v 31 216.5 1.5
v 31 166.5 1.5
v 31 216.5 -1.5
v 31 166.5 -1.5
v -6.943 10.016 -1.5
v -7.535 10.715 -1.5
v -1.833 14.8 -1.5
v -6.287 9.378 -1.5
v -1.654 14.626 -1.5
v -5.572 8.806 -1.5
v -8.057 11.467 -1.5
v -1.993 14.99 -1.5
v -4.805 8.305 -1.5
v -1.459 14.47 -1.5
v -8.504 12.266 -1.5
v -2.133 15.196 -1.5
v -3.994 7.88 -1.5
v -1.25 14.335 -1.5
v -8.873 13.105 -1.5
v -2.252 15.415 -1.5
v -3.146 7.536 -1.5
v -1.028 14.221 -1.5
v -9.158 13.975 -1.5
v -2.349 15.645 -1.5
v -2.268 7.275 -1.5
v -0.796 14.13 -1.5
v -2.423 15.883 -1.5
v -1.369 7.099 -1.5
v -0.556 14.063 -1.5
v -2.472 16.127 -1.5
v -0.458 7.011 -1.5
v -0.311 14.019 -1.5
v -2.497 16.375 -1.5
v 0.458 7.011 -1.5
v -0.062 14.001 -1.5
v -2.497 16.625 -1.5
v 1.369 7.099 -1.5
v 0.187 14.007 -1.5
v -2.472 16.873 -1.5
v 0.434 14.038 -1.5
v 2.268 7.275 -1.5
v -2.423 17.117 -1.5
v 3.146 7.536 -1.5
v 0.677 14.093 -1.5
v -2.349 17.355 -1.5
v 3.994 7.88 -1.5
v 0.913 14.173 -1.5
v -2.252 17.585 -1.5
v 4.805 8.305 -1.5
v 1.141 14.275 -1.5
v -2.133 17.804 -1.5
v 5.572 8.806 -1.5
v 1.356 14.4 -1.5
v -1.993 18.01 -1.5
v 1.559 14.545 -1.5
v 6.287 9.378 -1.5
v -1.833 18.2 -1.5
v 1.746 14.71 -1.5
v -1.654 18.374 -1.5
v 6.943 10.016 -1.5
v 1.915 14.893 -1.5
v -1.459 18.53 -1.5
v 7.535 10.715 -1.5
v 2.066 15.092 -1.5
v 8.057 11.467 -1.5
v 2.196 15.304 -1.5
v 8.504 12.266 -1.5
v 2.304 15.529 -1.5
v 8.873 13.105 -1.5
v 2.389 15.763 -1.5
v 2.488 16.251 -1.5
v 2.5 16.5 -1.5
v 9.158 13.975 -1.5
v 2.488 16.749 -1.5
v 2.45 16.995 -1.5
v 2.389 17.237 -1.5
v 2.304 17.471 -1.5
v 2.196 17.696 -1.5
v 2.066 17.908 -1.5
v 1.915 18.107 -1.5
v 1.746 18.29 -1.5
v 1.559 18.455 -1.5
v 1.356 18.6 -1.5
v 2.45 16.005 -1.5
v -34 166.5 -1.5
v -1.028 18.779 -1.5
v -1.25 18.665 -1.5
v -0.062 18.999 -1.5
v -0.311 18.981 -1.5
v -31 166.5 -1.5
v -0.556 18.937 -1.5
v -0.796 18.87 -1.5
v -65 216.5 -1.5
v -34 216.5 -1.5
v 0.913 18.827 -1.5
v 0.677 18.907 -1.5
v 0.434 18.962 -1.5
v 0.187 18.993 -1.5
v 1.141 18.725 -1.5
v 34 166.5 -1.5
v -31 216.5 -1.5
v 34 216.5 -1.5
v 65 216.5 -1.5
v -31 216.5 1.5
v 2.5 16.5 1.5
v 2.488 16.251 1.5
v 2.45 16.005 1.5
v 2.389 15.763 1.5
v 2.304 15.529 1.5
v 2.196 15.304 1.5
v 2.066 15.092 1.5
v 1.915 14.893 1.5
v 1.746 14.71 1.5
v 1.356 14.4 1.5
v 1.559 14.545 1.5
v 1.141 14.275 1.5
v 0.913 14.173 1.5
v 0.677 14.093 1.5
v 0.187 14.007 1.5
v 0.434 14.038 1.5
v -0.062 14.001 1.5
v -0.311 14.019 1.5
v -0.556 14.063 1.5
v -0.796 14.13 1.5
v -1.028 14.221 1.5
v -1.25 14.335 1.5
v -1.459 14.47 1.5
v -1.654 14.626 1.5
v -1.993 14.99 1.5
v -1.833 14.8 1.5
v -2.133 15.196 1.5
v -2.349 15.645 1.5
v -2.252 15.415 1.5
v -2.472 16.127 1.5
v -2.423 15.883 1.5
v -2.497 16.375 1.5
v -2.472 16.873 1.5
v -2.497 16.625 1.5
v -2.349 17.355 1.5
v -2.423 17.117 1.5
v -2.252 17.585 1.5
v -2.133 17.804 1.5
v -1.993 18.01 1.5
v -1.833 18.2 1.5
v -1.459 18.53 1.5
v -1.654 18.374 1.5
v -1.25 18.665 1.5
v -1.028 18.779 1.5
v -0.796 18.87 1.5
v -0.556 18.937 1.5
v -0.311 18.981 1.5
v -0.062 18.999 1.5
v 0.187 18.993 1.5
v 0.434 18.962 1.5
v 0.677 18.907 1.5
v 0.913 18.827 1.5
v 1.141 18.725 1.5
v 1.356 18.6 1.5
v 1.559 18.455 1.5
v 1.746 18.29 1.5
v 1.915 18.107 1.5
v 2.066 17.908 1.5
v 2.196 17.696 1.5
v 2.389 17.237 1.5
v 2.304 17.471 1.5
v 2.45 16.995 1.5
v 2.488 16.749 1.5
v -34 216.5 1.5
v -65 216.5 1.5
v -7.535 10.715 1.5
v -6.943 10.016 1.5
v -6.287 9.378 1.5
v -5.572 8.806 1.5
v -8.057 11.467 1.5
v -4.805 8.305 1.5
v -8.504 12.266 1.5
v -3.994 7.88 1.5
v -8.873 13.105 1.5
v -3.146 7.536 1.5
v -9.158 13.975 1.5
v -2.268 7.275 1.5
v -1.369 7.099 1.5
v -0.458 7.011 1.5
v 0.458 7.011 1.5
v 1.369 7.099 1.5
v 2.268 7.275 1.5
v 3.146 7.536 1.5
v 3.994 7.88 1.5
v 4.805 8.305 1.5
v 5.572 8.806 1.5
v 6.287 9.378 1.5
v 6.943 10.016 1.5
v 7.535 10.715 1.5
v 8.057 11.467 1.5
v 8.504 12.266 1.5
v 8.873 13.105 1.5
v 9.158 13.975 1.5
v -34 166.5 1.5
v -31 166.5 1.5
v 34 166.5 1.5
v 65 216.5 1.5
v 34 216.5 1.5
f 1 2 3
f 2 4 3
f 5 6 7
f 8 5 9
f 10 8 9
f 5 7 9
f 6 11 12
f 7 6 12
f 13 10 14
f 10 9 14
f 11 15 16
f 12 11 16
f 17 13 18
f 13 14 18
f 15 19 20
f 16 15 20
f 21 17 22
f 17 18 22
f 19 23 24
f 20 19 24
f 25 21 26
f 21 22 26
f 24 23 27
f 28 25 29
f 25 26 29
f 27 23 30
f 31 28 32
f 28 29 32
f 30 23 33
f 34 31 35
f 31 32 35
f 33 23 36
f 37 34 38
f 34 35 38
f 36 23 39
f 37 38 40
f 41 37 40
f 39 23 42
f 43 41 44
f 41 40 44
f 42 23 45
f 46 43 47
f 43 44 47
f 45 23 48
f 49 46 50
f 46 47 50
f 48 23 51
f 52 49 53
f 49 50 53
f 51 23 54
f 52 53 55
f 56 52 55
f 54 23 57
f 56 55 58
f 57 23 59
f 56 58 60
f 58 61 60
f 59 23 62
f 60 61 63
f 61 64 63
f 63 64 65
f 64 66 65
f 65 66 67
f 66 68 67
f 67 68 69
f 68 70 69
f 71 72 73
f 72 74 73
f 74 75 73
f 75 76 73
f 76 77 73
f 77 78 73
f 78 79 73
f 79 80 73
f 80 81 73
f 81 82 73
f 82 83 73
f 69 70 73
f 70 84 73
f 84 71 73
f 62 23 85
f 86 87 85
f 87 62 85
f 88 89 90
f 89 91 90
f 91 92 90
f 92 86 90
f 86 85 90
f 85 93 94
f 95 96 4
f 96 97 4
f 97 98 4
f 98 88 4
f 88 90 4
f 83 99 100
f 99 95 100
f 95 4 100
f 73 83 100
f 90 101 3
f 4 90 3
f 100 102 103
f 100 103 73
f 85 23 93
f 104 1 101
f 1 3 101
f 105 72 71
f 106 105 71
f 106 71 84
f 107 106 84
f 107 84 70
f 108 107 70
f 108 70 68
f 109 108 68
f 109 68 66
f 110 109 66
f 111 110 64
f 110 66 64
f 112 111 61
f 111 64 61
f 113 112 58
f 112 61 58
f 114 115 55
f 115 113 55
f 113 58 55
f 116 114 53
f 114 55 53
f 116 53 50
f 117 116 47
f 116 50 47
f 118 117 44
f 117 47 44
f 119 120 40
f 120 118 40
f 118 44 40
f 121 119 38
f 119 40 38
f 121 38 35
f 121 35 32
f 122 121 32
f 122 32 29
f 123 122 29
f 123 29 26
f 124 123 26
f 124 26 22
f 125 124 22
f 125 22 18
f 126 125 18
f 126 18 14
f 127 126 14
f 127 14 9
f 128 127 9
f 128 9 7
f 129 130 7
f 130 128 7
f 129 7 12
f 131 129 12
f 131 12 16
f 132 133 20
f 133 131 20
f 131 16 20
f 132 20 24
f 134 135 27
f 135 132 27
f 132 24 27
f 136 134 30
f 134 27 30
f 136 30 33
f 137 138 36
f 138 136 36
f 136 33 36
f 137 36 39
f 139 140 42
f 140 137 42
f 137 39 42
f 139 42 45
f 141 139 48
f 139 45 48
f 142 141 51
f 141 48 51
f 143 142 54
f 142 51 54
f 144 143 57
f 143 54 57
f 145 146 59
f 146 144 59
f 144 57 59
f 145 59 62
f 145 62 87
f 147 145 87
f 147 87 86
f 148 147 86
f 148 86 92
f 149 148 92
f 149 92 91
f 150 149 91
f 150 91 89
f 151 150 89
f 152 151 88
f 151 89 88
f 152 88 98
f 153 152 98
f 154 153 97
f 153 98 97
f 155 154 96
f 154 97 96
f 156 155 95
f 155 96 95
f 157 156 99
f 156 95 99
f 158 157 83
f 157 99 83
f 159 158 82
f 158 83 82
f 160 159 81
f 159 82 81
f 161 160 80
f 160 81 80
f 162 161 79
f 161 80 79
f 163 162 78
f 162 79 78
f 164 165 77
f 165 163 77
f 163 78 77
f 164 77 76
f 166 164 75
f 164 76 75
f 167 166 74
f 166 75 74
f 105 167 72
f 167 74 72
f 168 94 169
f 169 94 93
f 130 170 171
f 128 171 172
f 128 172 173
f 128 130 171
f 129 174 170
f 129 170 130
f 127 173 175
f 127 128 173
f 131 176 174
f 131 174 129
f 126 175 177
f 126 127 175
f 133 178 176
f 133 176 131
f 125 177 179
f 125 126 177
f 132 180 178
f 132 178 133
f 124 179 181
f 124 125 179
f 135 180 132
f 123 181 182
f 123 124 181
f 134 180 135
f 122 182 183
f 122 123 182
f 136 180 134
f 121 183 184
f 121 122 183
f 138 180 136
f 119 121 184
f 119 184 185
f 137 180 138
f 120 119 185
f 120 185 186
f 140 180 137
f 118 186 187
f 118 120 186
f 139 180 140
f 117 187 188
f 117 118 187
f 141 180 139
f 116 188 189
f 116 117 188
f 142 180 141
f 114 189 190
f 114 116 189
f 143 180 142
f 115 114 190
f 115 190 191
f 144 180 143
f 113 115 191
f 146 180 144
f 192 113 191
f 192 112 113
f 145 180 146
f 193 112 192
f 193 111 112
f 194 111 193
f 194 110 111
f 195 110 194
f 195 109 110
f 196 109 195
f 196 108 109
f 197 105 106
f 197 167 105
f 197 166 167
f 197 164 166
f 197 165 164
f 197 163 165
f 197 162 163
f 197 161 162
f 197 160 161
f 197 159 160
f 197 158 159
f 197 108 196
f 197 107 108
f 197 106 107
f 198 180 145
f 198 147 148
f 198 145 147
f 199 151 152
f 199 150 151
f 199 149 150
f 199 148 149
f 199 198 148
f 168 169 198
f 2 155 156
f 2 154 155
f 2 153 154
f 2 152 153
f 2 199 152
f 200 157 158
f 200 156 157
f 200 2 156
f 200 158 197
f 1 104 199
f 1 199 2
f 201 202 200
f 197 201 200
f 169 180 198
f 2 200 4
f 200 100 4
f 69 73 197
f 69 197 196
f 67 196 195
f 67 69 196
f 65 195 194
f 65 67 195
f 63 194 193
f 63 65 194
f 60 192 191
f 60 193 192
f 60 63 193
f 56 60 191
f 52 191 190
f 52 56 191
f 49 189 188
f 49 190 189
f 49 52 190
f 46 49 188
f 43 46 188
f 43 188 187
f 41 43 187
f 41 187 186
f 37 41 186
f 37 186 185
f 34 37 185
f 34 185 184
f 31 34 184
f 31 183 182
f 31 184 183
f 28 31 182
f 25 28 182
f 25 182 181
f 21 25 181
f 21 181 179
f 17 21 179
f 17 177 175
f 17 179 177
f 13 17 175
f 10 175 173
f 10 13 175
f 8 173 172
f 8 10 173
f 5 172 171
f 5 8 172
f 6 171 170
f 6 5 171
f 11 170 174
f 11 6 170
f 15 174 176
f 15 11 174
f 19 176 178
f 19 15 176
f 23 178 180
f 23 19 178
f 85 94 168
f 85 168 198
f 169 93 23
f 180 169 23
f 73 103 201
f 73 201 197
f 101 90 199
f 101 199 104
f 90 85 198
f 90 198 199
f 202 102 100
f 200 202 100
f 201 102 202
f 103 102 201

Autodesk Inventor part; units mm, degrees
ref_plane "YZ Plane" through (0, 0, 0) normal (1, 0, 0) x (0, 1, 0)
ref_plane "XZ Plane" through (0, 0, 0) normal (0, 1, 0) x (-1, 0, 0)
ref_plane "XY Plane" through (0, 0, 0) normal (0, 0, 1) x (1, 0, 0)
sketch "Sketch1" plane through (0, 0, 0) normal (0, 0, 1) x (1, 0, 0)
  circle A0 centre (0, 16.5) radius 2.5 projected
  line L0 (0, 16.5) -> (0, 216.5) construction
  arc A1 (-9.1582, 13.9748) -> (9.1582, 13.9748) centre (0, 16.5) ccw
  line L1 (65, 216.5) -> (9.1582, 13.9748)
  circle A2 centre (0, 16.5) radius 2.5
  line L2 (34, 216.5) -> (34, 166.5)
  line L3 (34, 166.5) -> (31, 166.5)
  line L4 (31, 166.5) -> (31, 216.5)
  line L5 (0, 216.5) -> (31, 216.5)
  line L6 (34, 216.5) -> (65, 216.5)
  line L7 (-65, 216.5) -> (-9.1582, 13.9748)
  line L8 (-34, 216.5) -> (-34, 166.5)
  line L9 (-34, 166.5) -> (-31, 166.5)
  line L10 (-31, 166.5) -> (-31, 216.5)
  line L11 (0, 216.5) -> (-31, 216.5)
  line L12 (-34, 216.5) -> (-65, 216.5)
  point P0 (0, 0)
  dimension "d0" = 200
  dimension "d1" = 65
  dimension "d2" = 19
  dimension "d7" = 50
  dimension "d8" = 3
  dimension "d9" = 31
extrude "Extrusion2" add sketch "Sketch1" along normal blind 1.5 and the other way blind 1.5
properties part number "Pivote_Estructura"
